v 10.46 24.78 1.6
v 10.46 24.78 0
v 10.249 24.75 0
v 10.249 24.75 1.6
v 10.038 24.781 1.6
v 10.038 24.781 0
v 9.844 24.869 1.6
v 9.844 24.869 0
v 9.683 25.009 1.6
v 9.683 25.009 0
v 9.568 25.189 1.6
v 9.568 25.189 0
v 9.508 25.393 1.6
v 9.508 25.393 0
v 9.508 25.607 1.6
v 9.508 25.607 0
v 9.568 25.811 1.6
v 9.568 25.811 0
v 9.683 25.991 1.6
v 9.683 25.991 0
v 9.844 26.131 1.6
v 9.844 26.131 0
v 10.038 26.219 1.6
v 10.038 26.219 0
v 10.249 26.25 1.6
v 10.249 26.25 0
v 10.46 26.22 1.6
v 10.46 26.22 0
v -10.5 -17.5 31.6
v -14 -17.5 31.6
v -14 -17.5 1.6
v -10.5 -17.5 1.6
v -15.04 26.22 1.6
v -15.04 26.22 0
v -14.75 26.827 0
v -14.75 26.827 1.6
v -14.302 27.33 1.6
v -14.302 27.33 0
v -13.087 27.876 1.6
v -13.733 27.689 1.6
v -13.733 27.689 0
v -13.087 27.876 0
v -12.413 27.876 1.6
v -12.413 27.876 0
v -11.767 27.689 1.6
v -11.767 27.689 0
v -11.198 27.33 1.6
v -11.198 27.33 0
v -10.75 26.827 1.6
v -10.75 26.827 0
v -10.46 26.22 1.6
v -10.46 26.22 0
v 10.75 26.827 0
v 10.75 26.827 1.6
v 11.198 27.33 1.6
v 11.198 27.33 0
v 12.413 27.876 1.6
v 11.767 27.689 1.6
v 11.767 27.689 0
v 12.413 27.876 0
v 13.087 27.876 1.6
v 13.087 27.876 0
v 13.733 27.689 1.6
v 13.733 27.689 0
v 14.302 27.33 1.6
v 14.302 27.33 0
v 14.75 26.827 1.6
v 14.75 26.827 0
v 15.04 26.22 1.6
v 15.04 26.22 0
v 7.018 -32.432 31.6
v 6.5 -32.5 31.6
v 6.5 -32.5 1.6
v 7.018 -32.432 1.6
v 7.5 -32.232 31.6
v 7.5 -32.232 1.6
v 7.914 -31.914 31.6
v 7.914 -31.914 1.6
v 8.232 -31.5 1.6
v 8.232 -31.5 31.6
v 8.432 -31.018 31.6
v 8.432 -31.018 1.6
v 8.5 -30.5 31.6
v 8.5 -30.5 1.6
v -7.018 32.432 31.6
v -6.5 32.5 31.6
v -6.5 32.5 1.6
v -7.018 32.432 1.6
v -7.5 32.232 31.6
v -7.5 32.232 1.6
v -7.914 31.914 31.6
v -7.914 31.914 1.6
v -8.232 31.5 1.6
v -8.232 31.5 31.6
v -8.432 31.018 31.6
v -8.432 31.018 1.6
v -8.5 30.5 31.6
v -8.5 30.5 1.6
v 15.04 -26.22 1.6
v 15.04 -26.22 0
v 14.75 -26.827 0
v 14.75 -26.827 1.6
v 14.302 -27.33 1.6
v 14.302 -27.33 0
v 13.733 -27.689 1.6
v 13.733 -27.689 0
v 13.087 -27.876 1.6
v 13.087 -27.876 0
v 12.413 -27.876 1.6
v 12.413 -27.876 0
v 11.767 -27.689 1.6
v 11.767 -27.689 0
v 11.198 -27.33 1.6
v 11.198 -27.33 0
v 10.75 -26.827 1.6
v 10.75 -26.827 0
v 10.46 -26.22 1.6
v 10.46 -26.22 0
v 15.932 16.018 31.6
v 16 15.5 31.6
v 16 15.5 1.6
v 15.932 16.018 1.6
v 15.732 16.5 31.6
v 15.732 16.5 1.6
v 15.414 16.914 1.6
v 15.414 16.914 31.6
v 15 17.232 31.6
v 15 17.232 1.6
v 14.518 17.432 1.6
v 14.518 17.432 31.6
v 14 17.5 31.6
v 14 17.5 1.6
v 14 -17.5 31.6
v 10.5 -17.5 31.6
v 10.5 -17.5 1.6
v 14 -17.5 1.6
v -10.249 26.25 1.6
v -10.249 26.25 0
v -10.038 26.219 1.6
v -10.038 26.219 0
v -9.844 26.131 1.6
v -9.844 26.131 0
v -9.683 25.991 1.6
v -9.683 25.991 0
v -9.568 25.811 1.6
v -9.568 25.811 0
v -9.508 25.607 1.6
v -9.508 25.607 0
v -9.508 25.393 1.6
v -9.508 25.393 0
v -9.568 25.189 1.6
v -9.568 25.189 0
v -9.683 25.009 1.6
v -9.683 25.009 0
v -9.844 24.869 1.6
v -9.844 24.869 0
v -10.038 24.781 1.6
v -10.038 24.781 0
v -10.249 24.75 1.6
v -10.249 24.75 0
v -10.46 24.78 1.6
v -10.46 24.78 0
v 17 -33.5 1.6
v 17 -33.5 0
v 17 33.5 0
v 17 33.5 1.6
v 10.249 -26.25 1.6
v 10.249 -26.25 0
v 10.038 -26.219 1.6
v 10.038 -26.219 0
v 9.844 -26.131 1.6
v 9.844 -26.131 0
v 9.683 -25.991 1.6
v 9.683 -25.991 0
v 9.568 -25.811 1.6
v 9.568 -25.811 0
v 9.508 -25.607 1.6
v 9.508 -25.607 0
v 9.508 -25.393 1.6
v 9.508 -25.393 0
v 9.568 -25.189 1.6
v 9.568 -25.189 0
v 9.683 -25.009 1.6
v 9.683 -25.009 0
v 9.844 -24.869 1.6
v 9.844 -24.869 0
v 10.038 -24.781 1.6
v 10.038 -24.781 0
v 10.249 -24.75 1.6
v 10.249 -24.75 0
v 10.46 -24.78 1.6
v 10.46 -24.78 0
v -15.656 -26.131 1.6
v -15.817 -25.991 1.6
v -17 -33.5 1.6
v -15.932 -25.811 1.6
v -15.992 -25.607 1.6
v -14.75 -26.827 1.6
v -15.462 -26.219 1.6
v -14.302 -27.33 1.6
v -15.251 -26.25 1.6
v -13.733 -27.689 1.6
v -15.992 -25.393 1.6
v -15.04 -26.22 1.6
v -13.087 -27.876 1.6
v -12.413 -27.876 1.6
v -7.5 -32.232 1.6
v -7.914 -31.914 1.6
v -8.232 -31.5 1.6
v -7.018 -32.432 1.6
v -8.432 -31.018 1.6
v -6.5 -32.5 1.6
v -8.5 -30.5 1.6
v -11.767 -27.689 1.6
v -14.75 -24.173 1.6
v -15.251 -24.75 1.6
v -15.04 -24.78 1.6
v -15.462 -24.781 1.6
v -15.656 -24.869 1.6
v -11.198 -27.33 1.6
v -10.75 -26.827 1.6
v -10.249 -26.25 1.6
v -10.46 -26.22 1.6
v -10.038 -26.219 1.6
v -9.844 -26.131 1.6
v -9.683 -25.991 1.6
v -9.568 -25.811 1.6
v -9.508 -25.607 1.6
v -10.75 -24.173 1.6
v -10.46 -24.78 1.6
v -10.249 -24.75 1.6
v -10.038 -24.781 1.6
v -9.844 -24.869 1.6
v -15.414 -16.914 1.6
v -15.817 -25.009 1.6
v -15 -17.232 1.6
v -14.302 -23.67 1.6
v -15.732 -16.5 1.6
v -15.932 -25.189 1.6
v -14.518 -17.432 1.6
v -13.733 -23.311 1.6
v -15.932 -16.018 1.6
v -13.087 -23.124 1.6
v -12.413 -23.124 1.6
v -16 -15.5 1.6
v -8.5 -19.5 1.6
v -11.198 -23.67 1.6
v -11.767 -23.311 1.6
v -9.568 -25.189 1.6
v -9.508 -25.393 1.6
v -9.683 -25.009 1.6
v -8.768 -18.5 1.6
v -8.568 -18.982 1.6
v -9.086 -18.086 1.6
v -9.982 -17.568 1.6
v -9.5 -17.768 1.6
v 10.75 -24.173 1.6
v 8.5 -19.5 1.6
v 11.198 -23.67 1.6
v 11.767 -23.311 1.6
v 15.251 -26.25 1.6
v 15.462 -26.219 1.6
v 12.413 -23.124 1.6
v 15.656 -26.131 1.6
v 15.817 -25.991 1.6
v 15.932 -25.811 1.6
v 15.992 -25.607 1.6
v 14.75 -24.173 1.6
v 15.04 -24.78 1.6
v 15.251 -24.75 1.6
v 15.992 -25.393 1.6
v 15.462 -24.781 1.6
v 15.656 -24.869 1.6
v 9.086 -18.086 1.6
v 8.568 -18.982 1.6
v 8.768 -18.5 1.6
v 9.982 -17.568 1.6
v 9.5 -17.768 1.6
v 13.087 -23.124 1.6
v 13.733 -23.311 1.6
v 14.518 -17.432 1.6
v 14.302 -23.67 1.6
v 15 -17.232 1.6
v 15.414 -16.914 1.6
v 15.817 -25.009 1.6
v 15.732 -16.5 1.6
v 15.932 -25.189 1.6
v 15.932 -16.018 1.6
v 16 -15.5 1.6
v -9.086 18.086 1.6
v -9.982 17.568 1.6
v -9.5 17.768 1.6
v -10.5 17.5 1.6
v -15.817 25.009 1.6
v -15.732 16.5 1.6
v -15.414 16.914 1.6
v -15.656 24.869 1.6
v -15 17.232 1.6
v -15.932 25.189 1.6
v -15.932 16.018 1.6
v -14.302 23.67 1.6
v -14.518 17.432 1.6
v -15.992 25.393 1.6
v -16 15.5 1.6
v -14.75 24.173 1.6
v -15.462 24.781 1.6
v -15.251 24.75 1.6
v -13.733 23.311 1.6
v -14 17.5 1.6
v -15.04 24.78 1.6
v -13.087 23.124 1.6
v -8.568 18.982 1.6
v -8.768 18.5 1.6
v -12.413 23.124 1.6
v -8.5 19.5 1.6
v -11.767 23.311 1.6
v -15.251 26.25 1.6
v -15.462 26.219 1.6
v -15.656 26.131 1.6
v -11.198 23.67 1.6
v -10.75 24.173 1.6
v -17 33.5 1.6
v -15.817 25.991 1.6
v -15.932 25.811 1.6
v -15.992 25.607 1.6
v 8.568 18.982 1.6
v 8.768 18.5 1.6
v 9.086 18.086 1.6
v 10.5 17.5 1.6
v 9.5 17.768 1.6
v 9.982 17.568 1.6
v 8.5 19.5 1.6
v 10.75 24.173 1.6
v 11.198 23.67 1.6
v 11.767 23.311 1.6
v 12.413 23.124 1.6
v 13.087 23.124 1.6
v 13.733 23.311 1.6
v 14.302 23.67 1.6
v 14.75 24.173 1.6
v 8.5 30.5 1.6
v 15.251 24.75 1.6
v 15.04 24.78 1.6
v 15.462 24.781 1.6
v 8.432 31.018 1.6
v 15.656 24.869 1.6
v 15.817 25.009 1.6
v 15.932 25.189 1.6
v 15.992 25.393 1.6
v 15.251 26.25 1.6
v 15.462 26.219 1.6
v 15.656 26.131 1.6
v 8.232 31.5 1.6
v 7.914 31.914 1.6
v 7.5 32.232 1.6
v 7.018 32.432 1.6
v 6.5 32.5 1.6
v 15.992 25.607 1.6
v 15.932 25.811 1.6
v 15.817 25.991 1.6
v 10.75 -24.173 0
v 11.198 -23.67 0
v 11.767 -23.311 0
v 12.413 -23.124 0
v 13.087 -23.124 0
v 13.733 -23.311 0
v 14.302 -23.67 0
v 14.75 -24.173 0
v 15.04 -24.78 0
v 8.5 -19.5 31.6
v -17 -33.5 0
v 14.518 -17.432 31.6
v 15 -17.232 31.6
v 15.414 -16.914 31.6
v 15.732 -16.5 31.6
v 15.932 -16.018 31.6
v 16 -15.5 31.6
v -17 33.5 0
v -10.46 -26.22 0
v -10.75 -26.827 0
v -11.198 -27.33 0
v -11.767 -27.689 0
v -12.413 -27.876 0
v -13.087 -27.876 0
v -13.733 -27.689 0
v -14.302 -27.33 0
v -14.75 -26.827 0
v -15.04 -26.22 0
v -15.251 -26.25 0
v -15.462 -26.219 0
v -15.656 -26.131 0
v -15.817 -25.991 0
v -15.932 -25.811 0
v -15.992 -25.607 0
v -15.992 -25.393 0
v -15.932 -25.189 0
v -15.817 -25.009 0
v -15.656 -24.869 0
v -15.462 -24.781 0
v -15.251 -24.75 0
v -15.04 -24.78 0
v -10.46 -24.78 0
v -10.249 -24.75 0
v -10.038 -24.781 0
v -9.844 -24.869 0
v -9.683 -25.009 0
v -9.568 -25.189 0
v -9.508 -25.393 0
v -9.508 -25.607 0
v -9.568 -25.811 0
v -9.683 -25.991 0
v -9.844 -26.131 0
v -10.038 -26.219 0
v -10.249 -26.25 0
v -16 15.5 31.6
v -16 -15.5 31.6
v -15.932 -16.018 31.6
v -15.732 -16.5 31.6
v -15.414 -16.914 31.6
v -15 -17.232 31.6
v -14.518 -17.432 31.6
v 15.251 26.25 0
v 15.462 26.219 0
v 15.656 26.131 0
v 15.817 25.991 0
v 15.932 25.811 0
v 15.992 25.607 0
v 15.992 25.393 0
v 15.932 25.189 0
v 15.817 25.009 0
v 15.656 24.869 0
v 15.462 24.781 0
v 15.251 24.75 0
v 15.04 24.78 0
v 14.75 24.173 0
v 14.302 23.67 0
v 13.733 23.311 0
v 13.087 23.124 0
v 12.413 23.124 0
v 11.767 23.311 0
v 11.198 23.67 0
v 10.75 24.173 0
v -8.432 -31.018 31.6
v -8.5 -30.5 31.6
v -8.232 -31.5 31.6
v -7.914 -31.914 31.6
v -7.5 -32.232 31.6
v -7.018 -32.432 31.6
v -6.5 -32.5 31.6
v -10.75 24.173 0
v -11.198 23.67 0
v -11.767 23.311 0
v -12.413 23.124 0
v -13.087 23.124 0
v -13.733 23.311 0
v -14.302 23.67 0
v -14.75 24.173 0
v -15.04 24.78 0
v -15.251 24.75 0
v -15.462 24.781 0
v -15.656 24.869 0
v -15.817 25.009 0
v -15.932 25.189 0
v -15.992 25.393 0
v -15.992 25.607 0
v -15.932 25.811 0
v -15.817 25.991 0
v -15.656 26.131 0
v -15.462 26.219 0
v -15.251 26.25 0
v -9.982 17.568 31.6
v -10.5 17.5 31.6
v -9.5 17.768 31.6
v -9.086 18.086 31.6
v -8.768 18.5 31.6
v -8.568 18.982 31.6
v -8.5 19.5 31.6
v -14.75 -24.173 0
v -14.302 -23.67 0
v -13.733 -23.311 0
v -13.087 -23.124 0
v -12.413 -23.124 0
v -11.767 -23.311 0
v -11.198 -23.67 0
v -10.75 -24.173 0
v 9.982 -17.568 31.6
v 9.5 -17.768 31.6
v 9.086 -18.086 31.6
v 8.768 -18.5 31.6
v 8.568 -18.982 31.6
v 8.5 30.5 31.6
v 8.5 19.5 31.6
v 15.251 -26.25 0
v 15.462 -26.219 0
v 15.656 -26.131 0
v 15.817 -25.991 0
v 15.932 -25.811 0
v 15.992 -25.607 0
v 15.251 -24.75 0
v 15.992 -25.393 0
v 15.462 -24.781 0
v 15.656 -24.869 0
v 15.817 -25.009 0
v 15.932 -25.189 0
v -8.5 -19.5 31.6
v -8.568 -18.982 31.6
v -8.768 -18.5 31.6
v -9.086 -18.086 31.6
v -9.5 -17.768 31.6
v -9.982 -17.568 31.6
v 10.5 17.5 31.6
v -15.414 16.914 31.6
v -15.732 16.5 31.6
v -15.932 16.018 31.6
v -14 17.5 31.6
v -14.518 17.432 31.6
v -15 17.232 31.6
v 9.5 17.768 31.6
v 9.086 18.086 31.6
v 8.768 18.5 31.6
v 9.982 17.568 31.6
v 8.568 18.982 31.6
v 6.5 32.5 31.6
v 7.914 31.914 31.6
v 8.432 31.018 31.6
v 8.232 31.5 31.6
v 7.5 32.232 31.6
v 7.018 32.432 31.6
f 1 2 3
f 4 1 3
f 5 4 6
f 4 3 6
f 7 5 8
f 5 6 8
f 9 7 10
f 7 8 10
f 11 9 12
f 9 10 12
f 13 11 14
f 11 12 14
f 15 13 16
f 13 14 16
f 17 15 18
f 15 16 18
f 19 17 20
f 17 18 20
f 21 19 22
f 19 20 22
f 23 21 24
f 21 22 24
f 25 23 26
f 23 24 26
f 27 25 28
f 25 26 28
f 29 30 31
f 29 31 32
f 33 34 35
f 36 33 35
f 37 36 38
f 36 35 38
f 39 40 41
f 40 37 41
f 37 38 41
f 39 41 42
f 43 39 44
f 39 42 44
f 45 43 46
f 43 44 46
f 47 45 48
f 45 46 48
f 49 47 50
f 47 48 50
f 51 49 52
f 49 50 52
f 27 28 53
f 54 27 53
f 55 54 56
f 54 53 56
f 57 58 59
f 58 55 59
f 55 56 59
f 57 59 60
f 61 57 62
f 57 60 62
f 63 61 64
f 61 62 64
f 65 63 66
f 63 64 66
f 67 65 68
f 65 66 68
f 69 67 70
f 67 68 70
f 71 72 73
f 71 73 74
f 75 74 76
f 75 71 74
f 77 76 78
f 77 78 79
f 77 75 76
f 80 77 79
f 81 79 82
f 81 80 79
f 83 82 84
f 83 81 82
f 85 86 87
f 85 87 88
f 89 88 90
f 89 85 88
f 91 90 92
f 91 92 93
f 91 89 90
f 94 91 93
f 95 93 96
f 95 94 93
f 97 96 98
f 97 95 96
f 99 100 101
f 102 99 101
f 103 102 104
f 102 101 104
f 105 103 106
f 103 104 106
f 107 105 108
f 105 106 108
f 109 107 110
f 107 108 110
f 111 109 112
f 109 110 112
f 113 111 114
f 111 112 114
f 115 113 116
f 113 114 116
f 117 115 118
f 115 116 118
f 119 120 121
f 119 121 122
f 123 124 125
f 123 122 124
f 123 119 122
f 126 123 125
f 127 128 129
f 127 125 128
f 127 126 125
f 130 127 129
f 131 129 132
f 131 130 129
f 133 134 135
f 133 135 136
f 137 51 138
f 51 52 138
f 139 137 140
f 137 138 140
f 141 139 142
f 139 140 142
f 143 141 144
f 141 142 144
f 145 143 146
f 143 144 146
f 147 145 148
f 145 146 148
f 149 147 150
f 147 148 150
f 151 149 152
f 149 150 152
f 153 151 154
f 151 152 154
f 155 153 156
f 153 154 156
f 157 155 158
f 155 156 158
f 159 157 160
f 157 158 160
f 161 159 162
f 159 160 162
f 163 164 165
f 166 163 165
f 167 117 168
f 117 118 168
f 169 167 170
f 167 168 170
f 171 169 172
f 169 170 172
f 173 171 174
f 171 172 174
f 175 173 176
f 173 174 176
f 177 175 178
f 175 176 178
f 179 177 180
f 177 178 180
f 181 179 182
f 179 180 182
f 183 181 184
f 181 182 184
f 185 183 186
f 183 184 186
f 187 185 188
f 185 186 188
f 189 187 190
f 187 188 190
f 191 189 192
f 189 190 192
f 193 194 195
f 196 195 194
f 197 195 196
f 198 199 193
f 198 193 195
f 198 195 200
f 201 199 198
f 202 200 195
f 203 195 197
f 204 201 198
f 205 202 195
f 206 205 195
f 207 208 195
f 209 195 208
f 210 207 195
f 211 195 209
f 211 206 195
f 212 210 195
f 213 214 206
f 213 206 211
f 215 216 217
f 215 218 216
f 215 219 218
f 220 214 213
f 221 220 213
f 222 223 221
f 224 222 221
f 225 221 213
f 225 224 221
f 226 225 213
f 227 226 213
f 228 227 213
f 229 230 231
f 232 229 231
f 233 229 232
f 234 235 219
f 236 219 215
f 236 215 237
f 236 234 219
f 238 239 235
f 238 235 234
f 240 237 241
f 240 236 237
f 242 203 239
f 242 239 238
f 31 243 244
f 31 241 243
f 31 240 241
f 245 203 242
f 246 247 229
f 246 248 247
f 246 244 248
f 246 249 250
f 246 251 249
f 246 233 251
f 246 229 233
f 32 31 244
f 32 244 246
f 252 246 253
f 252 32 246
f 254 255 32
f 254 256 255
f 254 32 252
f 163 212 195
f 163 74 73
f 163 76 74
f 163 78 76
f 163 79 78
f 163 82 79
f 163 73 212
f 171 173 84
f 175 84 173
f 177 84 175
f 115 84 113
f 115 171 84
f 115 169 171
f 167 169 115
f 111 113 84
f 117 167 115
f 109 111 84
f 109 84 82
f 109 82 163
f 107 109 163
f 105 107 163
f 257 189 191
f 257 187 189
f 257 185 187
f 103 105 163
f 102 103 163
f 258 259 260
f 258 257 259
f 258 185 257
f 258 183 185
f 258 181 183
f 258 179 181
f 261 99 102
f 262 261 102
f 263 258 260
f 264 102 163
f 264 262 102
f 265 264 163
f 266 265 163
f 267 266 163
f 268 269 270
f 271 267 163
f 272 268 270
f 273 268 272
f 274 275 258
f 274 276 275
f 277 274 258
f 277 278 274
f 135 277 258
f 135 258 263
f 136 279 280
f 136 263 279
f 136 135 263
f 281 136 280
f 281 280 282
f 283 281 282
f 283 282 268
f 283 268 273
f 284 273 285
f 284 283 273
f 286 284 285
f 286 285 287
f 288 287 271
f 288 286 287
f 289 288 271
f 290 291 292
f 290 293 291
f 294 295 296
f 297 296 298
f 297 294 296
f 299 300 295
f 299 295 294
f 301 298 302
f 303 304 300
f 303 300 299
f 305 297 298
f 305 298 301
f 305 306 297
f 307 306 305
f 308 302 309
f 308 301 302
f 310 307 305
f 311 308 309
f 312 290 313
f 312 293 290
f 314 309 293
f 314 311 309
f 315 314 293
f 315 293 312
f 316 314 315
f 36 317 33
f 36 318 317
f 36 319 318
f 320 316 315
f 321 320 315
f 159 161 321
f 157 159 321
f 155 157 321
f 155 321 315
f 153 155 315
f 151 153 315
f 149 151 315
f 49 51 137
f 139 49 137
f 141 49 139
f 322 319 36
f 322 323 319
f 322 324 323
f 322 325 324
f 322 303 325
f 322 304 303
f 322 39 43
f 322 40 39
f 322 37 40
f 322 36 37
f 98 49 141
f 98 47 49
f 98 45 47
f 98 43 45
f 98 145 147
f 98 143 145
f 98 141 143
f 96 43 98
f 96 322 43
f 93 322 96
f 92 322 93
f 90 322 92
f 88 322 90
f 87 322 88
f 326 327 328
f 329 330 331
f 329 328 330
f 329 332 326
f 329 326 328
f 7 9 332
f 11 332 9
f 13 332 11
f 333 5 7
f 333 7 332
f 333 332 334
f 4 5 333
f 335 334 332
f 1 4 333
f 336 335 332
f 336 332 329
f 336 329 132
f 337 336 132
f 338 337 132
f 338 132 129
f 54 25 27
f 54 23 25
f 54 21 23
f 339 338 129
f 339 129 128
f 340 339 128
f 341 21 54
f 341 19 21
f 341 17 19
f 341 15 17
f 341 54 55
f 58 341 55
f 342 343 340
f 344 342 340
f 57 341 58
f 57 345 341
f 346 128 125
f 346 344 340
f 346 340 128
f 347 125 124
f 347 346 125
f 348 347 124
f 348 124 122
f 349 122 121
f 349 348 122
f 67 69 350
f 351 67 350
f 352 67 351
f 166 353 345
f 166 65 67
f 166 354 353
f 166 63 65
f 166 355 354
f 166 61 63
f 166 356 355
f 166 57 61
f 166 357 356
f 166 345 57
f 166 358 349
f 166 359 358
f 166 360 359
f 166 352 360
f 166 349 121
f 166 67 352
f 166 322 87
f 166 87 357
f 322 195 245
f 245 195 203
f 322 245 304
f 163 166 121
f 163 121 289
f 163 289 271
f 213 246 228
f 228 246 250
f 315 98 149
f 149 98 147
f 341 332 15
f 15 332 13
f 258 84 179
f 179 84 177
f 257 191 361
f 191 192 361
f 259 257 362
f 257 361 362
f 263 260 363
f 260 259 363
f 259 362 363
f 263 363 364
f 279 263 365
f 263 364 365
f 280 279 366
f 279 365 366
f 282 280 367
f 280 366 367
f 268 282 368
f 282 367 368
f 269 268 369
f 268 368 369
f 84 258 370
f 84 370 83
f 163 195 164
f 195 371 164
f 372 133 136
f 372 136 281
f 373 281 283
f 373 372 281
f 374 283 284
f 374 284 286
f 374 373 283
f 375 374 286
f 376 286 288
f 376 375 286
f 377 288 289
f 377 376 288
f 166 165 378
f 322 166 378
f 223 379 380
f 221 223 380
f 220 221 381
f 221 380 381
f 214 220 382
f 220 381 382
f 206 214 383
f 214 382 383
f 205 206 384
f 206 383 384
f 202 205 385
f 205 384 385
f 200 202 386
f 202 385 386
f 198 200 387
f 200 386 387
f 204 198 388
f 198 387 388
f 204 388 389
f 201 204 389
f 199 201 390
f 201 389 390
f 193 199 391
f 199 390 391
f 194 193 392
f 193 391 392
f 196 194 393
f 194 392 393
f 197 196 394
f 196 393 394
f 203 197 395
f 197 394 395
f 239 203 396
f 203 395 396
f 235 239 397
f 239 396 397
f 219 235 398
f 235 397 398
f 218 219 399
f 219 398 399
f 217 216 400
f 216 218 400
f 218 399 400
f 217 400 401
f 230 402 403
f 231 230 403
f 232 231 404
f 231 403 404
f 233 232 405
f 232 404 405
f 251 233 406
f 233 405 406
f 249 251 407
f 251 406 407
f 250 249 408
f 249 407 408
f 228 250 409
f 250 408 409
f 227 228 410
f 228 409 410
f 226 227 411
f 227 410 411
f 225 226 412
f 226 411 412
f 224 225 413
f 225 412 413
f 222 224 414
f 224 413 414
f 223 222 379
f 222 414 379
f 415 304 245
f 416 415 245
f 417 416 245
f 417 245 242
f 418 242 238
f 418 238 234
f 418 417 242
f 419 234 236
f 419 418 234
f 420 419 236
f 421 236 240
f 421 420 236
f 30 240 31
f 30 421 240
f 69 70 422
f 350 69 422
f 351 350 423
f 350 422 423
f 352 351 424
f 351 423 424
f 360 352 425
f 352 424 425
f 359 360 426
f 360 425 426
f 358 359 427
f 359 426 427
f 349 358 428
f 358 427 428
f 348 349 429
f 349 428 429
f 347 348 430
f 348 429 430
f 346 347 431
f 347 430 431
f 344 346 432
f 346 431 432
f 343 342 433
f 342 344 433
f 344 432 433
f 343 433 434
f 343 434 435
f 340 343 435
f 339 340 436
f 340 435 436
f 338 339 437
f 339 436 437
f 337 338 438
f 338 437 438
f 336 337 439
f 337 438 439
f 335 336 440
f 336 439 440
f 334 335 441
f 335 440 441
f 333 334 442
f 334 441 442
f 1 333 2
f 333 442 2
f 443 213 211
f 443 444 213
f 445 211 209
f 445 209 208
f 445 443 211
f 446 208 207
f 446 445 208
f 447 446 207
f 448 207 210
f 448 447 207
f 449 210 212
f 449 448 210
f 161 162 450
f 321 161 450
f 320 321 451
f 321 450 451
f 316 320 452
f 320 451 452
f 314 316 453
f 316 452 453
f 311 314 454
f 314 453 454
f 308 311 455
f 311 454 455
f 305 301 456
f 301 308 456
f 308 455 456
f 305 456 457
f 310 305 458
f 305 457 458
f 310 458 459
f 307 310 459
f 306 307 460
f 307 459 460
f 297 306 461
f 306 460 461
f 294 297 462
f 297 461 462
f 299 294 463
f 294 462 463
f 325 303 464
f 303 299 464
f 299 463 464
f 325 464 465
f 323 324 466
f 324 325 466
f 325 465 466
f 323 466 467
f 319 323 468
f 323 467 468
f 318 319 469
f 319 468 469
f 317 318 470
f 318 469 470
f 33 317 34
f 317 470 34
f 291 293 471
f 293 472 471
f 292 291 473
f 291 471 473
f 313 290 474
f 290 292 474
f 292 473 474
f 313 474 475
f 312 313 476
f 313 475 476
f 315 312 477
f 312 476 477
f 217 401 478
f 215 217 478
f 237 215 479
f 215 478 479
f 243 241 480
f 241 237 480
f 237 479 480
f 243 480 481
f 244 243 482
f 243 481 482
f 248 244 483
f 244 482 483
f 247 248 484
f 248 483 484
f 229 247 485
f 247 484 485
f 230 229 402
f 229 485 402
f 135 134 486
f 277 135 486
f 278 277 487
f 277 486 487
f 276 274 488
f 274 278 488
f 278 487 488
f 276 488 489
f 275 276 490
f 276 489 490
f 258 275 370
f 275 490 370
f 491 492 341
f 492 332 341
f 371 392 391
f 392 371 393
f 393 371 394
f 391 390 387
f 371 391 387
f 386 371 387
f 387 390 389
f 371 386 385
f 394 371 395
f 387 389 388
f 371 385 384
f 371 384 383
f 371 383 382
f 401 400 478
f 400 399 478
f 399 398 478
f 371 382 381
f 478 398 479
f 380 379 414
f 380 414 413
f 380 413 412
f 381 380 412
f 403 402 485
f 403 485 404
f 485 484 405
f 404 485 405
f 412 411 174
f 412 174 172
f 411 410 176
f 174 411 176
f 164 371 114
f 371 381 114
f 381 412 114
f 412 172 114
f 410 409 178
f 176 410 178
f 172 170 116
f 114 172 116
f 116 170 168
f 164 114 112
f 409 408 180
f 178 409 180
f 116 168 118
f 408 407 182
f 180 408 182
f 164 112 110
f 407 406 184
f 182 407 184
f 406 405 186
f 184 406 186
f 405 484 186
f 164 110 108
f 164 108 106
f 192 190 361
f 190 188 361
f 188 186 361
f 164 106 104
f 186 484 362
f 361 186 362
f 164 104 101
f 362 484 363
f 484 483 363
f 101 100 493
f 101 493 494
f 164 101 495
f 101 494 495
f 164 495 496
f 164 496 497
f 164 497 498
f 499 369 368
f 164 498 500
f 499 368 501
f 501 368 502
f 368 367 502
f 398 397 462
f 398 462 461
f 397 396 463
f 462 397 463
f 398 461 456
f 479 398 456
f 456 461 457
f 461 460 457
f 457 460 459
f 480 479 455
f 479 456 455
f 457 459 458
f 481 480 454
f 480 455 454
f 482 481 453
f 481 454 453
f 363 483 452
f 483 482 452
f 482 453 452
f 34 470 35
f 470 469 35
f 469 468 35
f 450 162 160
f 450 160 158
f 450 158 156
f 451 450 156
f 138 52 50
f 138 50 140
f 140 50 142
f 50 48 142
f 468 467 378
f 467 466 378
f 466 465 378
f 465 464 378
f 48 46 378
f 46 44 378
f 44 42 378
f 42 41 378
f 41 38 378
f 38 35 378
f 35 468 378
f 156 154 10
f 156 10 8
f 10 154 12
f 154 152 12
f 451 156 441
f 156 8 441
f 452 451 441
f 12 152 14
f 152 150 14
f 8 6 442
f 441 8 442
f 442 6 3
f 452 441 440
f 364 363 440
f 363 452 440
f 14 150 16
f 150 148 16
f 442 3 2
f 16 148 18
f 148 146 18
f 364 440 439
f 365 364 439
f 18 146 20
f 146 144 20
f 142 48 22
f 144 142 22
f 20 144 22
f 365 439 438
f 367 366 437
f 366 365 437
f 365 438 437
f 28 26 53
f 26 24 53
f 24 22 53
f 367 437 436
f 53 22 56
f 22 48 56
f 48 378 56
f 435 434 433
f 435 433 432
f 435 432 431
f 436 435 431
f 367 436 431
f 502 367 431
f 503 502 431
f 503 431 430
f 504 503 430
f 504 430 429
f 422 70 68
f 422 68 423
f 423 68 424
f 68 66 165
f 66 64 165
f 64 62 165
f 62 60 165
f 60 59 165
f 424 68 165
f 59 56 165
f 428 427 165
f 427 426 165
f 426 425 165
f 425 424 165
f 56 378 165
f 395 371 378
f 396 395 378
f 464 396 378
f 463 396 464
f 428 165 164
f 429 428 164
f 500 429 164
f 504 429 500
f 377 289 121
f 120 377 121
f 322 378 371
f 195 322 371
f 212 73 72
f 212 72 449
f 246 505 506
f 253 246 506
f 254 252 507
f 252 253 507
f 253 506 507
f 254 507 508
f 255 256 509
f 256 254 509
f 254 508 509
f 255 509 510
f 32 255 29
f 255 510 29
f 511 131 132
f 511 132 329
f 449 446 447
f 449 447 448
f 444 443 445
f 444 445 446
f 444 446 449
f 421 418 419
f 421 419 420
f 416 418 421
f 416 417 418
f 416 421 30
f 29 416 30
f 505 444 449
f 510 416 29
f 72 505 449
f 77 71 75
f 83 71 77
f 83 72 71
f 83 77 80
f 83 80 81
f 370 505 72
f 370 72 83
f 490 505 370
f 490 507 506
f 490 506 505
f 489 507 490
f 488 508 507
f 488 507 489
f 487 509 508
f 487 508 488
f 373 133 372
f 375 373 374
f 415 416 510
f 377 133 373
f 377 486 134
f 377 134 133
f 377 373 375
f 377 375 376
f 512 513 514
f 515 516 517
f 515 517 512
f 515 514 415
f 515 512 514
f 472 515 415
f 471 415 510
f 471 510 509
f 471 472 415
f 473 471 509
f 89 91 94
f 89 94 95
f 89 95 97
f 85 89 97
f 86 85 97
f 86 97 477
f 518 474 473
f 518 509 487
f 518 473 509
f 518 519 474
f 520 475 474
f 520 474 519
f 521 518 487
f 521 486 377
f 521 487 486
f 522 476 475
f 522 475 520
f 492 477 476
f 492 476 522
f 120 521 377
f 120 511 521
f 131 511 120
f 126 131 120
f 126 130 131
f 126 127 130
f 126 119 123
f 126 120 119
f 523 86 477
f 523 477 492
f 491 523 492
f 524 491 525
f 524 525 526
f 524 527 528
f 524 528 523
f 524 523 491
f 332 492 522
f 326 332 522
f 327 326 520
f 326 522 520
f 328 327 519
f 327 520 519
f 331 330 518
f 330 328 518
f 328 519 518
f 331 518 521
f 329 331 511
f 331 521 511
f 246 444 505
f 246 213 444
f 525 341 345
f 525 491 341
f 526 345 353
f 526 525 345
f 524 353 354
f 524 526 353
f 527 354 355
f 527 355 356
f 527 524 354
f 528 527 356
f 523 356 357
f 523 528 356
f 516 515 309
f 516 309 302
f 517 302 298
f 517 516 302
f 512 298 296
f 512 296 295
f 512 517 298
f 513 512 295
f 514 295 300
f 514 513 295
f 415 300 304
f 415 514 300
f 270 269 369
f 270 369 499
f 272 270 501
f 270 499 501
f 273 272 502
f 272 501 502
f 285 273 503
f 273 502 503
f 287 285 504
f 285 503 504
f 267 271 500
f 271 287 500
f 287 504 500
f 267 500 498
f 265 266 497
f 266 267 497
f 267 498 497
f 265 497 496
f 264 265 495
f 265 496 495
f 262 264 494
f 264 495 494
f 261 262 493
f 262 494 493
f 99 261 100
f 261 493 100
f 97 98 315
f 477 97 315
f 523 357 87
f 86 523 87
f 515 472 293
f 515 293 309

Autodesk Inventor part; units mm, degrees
ref_plane "YZ Plane" through (0, 0, 0) normal (1, 0, 0) x (0, 1, 0)
ref_plane "XZ Plane" through (0, 0, 0) normal (0, 1, 0) x (-1, 0, 0)
ref_plane "XY Plane" through (0, 0, 0) normal (0, 0, 1) x (1, 0, 0)
sketch "Sketch1" plane through (0, 0, 0) normal (0, 0, 1) x (1, 0, 0)
  line L0 (17, 33.5) -> (-17, 33.5)
  line L1 (-17, 33.5) -> (-17, -33.5)
  line L2 (-17, -33.5) -> (17, -33.5)
  line L3 (17, -33.5) -> (17, 33.5)
  line L4 (17, 33.5) -> (-17, -33.5) construction
  line L5 (-17, 33.5) -> (17, -33.5) construction
  line L6 (-12.75, 25.5) -> (12.75, 25.5) construction
  line L7 (12.75, 25.5) -> (12.75, -25.5) construction
  line L8 (12.75, -25.5) -> (-12.75, -25.5) construction
  line L9 (-12.75, -25.5) -> (-12.75, 25.5) construction
  line L10 (-12.75, 25.5) -> (12.75, -25.5) construction
  line L11 (12.75, 25.5) -> (-12.75, -25.5) construction
  line L12 (17, 0) -> (-17, 0) construction
  line L13 (0, 33.5) -> (0, -33.5) construction
  circle A0 centre (12.75, 25.5) radius 2.4
  circle A1 centre (-12.75, 25.5) radius 2.4
  circle A2 centre (12.75, -25.5) radius 2.4
  circle A3 centre (-12.75, -25.5) radius 2.4
  line L14 (12.75, 32.5) -> (12.75, 18.5) construction
  line L15 (16, 17.5) -> (-16, 17.5)
  line L16 (-16, 17.5) -> (-16, -17.5)
  line L17 (-16, -17.5) -> (16, -17.5)
  line L18 (16, -17.5) -> (16, 17.5)
  line L19 (16, 17.5) -> (-16, -17.5) construction
  line L20 (-16, 17.5) -> (16, -17.5) construction
  line L21 (8.5, 17.5) -> (8.5, 32.5)
  line L22 (8.5, 32.5) -> (-8.5, 32.5)
  line L23 (-8.5, 32.5) -> (-8.5, 17.5)
  line L24 (8.5, -17.5) -> (8.5, -32.5)
  line L25 (8.5, -32.5) -> (-8.5, -32.5)
  line L26 (-8.5, -32.5) -> (-8.5, -17.5)
  arc A4 (10.4605, 26.2199) -> (10.4605, 24.7801) centre (10.25, 25.5) ccw
  arc A5 (15.0395, 24.7801) -> (15.0395, 26.2199) centre (15.25, 25.5) ccw
  arc A6 (10.4605, -24.7801) -> (10.4605, -26.2199) centre (10.25, -25.5) ccw
  arc A7 (15.0395, -26.2199) -> (15.0395, -24.7801) centre (15.25, -25.5) ccw
  arc A8 (-10.4605, 24.7801) -> (-10.4605, 26.2199) centre (-10.25, 25.5) ccw
  arc A9 (-15.0395, 26.2199) -> (-15.0395, 24.7801) centre (-15.25, 25.5) ccw
  arc A10 (-10.4605, -26.2199) -> (-10.4605, -24.7801) centre (-10.25, -25.5) ccw
  arc A11 (-15.0395, -24.7801) -> (-15.0395, -26.2199) centre (-15.25, -25.5) ccw
  point P0 (0, 0)
  point P1 (8.5, -17.5)
  point P2 (-8.5, -17.5)
  point P3 (16, 25.5)
  point P4 (9.5, 25.5)
  point P5 (15.0395, 26.2199)
  point P6 (15.0395, 24.7801)
  point P7 (15.0395, -24.7801)
  point P8 (15.0395, -26.2199)
  point P9 (10.4605, -26.2199)
  point P10 (10.4605, -24.7801)
  point P11 (-15.0395, -26.2199)
  point P12 (-15.0395, -24.7801)
  point P13 (-10.4605, -24.7801)
  point P14 (-10.4605, -26.2199)
  point P15 (-15.0395, 24.7801)
  point P16 (-15.0395, 26.2199)
  point P17 (-10.4605, 26.2199)
  point P18 (-10.4605, 24.7801)
  dimension "d0" = 34
  dimension "d1" = 67
  dimension "d19" = 4.8
  dimension "d33" = 51
  dimension "d34" = 25.5
  dimension "d38" = 1
  dimension "d43" = 1
  dimension "d44" = 1
  dimension "d46" = 6.5
  dimension "d47" = 1.5
  dimension "d48" = 1
  dimension "d50" = 16
extrude "Extrusion1" add sketch "Sketch1" along normal blind 1.6 contours L3 L2 L1 L0 | L18 L17 L16 L15 | L15 L23 L22 L21 | L24 L25 L26 L17
extrude "Extrusion2" add sketch "Sketch1" along normal blind 31.6 contours L18 L17 L16 L15 | L15 L23 L22 L21 | L24 L25 L26 L17
fillet "Fillet1" radius 2 12 edges at (16, -17.5, 16.6) (16, 17.5, 16.6) (-16, -17.5, 16.6) (-16, 17.5, 16.6) (8.5, 17.5, 16.6) (8.5, -17.5, 16.6) (8.5, -32.5, 16.6) (-8.5, -32.5, 16.6) (-8.5, -17.5, 16.6) (-8.5, 17.5, 16.6) (-8.5, 32.5, 16.6) (8.5, 32.5, 16.6)
properties part number "SUSTAINA-POWER-DISTRIBUTION-BOARD" material "Acetal Resin, Black"
